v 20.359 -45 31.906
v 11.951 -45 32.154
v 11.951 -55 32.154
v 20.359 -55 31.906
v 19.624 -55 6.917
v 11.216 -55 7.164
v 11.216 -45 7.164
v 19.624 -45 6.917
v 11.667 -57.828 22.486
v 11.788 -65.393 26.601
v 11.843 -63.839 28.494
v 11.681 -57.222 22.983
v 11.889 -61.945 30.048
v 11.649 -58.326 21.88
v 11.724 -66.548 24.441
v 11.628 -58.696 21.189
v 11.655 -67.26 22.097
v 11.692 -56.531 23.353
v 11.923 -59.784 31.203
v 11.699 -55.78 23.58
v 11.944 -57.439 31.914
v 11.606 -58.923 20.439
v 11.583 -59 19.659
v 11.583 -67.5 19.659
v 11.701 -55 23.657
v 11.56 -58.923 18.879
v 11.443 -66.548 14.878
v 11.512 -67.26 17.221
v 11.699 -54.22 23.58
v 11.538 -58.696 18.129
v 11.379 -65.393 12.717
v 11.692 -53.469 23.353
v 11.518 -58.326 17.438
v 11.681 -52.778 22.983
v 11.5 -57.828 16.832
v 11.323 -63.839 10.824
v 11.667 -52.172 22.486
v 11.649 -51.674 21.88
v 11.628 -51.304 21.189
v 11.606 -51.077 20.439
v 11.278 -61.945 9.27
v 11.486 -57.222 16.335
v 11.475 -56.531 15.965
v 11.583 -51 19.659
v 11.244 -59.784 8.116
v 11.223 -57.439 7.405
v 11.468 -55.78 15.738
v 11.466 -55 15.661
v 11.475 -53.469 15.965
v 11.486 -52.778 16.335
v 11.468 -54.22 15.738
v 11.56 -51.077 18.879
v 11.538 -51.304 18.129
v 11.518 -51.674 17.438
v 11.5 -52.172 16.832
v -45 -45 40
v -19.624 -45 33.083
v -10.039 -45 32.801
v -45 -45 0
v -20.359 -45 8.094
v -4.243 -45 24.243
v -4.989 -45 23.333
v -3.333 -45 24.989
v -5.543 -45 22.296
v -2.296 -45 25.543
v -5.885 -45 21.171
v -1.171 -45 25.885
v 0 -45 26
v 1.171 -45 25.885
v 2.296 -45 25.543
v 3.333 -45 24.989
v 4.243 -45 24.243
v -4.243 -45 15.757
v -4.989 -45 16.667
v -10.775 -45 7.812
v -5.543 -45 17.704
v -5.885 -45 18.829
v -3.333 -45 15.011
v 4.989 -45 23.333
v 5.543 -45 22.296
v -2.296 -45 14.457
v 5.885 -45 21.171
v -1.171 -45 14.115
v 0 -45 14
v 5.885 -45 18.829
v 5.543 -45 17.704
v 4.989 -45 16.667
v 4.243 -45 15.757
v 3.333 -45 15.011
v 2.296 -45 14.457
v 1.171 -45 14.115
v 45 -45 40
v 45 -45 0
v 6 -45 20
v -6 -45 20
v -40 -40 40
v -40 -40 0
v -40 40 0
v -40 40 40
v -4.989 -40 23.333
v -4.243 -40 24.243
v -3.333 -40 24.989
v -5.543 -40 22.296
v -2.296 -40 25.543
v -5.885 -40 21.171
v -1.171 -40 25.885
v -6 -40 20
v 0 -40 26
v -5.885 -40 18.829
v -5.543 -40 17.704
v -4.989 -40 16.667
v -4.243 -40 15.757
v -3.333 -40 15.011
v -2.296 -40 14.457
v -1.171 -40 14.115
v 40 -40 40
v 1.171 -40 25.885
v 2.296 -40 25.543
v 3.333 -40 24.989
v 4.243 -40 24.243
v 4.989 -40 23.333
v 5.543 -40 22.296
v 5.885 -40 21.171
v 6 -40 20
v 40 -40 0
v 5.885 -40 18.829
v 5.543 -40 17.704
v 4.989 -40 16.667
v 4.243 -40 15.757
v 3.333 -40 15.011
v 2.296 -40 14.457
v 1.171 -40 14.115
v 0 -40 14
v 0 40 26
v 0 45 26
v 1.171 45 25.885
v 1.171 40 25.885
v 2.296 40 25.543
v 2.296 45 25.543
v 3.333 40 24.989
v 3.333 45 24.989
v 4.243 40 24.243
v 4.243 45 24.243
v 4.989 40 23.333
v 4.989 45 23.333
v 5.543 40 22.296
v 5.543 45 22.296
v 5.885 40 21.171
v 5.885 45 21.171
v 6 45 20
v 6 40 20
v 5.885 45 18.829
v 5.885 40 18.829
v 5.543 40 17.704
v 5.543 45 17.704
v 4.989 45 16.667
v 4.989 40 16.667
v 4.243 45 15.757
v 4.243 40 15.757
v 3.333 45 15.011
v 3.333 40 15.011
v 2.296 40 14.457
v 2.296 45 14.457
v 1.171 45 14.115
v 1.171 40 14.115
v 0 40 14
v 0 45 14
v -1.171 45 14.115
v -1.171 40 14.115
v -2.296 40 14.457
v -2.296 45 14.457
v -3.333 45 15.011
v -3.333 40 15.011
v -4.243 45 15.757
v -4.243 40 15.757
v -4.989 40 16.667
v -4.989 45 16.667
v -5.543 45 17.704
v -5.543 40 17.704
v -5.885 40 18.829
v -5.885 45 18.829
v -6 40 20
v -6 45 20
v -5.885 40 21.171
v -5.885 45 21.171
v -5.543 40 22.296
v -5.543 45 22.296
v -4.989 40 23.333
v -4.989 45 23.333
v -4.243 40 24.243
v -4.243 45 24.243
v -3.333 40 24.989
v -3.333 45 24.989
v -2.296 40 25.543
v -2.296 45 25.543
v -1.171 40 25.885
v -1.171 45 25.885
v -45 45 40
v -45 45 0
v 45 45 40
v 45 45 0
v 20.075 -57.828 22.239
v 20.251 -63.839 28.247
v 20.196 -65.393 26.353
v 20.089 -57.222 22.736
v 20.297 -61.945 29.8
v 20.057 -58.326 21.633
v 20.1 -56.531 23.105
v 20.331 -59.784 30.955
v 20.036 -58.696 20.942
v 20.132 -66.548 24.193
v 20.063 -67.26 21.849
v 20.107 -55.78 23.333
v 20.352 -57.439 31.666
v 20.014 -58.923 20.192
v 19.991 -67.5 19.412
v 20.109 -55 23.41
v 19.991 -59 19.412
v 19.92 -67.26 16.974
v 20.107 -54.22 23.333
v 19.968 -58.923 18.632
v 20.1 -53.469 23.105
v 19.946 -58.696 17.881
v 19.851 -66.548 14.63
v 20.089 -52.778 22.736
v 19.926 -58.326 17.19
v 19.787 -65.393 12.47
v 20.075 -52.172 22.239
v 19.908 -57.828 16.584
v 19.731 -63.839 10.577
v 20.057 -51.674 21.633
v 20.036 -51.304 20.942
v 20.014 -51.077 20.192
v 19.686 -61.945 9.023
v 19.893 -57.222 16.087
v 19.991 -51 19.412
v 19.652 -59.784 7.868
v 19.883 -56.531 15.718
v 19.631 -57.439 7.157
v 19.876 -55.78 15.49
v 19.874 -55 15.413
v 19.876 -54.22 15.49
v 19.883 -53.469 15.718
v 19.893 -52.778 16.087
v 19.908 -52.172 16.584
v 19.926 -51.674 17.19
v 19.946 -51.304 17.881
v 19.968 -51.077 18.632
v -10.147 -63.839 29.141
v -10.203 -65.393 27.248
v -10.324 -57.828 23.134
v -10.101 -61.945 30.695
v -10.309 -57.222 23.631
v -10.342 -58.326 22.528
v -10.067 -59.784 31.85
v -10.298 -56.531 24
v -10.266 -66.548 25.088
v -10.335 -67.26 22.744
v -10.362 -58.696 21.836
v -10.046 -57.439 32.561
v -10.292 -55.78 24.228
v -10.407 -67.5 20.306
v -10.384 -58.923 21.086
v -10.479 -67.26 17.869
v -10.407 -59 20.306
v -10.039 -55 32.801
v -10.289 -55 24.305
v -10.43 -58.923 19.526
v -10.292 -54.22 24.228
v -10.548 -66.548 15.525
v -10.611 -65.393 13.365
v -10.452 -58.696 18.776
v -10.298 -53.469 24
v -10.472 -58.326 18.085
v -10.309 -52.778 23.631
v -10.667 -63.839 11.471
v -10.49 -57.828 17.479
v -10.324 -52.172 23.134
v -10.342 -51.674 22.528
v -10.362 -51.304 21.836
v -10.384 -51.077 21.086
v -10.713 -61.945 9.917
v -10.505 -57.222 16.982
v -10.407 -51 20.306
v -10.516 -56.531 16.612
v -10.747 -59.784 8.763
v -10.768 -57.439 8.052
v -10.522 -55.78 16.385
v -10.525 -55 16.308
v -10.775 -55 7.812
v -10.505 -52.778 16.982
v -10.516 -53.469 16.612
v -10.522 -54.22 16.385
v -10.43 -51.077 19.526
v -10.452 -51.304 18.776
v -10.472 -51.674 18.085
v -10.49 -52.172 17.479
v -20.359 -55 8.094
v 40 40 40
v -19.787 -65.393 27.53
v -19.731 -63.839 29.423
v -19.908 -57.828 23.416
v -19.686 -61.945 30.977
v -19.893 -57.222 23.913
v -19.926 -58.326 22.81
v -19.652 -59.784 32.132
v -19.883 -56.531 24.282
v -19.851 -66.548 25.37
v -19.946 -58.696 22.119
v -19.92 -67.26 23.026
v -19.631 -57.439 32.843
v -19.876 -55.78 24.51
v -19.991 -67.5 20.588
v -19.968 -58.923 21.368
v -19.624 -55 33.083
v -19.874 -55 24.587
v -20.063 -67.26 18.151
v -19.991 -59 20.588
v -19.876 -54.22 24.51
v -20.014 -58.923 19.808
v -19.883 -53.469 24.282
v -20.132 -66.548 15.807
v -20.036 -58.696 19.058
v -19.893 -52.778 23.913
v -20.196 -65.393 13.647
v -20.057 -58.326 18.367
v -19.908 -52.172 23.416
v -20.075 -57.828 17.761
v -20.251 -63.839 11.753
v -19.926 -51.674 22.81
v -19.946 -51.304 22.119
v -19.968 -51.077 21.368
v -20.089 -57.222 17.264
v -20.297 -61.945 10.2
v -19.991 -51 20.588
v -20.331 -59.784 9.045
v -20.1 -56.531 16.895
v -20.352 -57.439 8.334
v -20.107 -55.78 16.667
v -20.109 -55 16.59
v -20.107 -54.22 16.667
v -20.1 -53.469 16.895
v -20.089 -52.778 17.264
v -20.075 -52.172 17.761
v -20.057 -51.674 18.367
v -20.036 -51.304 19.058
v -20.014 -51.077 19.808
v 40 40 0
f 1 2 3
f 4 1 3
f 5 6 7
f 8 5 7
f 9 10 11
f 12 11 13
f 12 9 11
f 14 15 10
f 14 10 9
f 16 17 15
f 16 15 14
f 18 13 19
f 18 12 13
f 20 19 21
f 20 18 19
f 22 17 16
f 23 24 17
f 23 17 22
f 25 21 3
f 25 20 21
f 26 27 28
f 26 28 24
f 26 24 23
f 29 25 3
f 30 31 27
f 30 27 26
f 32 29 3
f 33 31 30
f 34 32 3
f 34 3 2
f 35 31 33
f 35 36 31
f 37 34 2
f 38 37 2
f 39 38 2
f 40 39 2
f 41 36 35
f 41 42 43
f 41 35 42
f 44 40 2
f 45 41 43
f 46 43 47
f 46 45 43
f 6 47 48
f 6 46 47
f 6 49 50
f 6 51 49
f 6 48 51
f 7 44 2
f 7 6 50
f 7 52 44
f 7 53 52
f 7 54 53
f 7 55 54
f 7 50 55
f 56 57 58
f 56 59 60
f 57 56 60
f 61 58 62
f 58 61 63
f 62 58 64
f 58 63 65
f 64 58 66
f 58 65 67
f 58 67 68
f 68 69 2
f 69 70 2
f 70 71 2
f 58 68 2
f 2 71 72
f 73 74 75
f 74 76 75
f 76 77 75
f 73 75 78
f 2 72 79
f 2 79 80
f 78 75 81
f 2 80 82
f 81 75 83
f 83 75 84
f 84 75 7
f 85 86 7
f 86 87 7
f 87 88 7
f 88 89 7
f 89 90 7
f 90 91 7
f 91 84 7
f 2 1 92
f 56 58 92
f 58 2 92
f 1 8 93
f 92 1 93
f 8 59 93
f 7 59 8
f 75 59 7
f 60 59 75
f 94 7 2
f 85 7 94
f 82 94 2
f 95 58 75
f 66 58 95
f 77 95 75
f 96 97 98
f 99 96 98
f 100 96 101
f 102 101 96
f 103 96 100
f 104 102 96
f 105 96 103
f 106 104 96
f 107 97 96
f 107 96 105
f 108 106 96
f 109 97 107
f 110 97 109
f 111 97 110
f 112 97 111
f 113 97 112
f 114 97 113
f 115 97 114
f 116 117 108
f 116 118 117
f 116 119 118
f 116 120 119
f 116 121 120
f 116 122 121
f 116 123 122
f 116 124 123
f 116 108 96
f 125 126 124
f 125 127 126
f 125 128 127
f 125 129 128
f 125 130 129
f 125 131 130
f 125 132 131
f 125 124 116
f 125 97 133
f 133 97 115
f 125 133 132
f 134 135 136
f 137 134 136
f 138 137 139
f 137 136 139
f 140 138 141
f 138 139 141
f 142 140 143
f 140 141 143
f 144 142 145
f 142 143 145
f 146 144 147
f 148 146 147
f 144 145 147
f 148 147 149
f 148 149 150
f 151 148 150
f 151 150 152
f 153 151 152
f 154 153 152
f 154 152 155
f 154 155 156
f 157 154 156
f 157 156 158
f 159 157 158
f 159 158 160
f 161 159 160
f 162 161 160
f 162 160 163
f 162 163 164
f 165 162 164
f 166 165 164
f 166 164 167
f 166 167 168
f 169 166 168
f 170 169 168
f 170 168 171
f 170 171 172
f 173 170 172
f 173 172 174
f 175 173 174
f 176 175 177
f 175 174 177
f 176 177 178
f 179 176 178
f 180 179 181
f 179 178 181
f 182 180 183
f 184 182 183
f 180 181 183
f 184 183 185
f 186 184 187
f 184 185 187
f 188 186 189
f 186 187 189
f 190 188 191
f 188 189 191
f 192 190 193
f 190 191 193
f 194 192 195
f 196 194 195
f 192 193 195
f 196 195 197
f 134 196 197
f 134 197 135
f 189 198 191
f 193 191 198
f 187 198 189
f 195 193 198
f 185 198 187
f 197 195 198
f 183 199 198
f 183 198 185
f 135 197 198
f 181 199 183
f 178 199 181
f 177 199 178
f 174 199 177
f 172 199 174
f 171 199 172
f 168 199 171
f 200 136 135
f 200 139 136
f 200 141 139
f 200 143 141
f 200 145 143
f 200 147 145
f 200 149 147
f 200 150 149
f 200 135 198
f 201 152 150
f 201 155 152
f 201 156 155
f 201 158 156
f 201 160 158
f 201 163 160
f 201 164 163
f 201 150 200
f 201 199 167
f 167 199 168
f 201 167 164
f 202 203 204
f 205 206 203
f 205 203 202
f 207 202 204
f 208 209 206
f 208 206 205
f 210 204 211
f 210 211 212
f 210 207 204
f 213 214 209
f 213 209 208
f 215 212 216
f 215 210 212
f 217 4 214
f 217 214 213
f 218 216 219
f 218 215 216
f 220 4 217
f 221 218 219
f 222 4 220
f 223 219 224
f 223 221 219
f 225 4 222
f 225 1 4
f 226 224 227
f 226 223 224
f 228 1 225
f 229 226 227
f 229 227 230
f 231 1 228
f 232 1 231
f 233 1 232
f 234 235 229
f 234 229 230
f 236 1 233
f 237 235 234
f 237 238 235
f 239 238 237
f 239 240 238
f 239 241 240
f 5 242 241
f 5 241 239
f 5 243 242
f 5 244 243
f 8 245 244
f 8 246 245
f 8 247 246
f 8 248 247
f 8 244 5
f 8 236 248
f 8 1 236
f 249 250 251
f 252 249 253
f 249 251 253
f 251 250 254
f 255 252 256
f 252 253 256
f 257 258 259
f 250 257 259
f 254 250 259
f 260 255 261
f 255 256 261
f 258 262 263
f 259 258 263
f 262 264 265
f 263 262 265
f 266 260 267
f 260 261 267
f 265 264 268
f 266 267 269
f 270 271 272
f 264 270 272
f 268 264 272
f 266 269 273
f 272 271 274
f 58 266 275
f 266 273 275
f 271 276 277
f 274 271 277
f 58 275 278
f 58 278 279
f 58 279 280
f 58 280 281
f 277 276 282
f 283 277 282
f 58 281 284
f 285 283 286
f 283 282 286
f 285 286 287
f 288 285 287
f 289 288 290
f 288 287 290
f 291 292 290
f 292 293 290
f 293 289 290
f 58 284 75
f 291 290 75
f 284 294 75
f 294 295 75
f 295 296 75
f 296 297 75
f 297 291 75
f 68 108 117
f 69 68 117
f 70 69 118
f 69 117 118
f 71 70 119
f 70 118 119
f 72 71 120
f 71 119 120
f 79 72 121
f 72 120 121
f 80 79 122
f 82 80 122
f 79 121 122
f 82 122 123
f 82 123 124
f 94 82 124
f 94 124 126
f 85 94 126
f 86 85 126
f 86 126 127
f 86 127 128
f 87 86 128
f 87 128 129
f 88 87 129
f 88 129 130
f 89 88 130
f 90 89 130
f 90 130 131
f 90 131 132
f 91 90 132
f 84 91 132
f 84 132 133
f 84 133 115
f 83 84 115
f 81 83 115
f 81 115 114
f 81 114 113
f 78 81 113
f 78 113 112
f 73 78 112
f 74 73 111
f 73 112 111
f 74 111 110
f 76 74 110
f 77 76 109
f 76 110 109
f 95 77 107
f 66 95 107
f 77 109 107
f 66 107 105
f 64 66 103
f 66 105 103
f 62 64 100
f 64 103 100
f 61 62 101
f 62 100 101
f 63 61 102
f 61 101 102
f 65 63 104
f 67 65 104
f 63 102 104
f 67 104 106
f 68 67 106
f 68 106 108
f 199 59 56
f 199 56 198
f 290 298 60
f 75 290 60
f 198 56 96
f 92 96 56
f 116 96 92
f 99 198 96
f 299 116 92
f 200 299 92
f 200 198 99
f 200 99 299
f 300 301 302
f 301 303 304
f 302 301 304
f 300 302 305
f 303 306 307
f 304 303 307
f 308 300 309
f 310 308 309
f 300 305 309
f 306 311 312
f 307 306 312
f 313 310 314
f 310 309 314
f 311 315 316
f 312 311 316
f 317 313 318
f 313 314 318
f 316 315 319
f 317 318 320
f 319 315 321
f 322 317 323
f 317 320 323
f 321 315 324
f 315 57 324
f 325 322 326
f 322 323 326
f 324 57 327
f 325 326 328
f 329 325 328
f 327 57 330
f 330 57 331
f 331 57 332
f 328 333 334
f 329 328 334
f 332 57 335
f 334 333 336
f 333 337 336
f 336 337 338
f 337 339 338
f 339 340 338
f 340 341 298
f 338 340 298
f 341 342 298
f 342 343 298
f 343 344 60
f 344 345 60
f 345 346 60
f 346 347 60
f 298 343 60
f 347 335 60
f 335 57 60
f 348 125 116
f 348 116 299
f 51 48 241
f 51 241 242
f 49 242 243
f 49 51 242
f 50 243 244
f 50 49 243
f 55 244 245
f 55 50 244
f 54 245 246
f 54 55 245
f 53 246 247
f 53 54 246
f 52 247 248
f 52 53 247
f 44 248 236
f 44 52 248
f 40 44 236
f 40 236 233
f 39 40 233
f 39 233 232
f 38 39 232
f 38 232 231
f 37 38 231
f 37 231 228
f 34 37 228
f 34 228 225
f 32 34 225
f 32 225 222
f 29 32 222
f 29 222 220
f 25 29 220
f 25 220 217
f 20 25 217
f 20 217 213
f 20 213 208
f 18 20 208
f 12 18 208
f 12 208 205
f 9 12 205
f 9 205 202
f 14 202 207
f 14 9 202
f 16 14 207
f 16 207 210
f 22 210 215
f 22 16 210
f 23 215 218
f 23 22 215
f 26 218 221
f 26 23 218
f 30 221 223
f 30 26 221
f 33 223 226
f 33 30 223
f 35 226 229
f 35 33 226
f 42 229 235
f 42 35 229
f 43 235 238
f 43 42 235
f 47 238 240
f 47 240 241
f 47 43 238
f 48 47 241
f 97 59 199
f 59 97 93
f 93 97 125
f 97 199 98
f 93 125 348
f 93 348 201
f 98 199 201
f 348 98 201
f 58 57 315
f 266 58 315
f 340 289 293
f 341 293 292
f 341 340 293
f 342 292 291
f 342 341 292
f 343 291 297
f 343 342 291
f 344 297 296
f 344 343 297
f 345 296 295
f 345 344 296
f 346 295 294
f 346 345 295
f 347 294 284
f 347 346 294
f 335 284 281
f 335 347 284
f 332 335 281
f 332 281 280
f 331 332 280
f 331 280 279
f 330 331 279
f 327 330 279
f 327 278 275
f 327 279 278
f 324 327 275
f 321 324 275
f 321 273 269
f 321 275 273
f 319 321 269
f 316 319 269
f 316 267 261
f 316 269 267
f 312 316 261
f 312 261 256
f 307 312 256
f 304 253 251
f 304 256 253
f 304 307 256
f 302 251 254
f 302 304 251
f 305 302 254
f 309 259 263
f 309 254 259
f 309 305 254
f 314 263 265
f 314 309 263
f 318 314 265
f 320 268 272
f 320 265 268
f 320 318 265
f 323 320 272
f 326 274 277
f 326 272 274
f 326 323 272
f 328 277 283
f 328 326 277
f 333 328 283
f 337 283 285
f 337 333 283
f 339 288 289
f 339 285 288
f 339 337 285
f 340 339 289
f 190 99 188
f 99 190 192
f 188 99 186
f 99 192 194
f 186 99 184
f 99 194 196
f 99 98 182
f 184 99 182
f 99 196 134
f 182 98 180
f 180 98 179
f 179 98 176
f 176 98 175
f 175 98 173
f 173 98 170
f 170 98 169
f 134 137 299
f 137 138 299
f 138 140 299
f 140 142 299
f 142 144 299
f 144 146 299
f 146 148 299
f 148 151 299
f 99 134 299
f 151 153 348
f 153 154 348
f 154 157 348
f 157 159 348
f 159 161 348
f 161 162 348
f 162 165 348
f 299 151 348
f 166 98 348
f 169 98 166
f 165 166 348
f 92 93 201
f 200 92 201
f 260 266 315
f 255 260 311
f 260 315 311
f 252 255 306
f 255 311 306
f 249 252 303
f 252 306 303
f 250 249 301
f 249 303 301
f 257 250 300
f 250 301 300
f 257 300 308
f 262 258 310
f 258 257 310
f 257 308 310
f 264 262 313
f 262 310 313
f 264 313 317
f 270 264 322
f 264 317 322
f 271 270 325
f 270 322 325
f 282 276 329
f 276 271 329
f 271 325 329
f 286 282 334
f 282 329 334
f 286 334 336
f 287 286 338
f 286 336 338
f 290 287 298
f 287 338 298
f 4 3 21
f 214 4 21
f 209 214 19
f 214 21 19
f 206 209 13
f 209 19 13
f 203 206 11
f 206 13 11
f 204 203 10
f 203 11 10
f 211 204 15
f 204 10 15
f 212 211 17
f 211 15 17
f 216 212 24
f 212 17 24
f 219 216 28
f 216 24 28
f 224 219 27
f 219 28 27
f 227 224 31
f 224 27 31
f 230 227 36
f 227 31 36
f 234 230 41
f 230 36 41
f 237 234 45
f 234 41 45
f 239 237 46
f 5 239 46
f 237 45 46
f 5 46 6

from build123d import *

# Parameters (mm, degrees)
SKETCH_1_W           = 90
SKETCH_1_H           = 90
SKETCH_1_W_2         = 80
SKETCH_1_H_2         = 80
EXTRUDE_1_DEPTH      = 40
SKETCH_3_R           = 6
CUT_EXTRUDE_2_DEPTH  = 109.282039139
EXTRUDE_2_DEPTH      = 20
EXTRUDE_2_DEPTH_BACK = 20
SKETCH_4_R           = 4
SKETCH_5_W           = 22
SKETCH_5_H           = 30
CUT_EXTRUDE_3_DEPTH  = 88.510910897


with BuildPart() as part:
    # 草图1 → 凸台-拉伸1 (new body)
    with BuildSketch(Plane.XY):
        Rectangle(SKETCH_1_W, SKETCH_1_H)
        Rectangle(SKETCH_1_W_2, SKETCH_1_H_2, mode=Mode.SUBTRACT)
    extrude(amount=EXTRUDE_1_DEPTH)

    # 草图3 → 切除-拉伸2 (cut, through all)
    with BuildSketch(Plane(origin=(0, 45, 0), x_dir=(1, 0, 0), z_dir=(0, 1, 0))):
        with Locations((0, -20)):
            Circle(SKETCH_3_R)
    extrude(amount=-CUT_EXTRUDE_2_DEPTH, mode=Mode.SUBTRACT)

    # 草图4 → 凸台-拉伸2 (add, two sides: drawn at the far end of the back side and taken through both)
    with BuildSketch(Plane(origin=(1.596612883, -1.997656421, 74.241754421), x_dir=(-0.029422382723106603, 0, -0.9995670679823816), z_dir=(0.9995670679823816, 0, -0.029422382723106603)).offset(-EXTRUDE_2_DEPTH_BACK)):
        with BuildLine():
            Line((41.765247584, -43.002343579), (41.765247584, -53.002343579))
            ThreePointArc((41.765247584, -53.002343579), (54.265247584, -65.502343579), (66.765247584, -53.002343579))
            Line((66.765247584, -53.002343579), (66.765247584, -43.002343579))
            Line((66.765247584, -43.002343579), (41.765247584, -43.002343579))
        make_face()
        with Locations((54.265247584, -53.002343579)):
            Circle(SKETCH_4_R, mode=Mode.SUBTRACT)
    extrude(amount=EXTRUDE_2_DEPTH + EXTRUDE_2_DEPTH_BACK)

    # 草图5 → 切除-拉伸3 (cut, through all)
    with BuildSketch(Plane(origin=(0.220413113, 0, 7.488098118), x_dir=(-0.9995670679823816, 0, 0.0294223827231066), z_dir=(-0.0294223827231066, 0, -0.9995670679823816))):
        with Locations((0, -60)):
            Rectangle(SKETCH_5_W, SKETCH_5_H)
    extrude(amount=-CUT_EXTRUDE_3_DEPTH, mode=Mode.SUBTRACT)


solid = part.part
